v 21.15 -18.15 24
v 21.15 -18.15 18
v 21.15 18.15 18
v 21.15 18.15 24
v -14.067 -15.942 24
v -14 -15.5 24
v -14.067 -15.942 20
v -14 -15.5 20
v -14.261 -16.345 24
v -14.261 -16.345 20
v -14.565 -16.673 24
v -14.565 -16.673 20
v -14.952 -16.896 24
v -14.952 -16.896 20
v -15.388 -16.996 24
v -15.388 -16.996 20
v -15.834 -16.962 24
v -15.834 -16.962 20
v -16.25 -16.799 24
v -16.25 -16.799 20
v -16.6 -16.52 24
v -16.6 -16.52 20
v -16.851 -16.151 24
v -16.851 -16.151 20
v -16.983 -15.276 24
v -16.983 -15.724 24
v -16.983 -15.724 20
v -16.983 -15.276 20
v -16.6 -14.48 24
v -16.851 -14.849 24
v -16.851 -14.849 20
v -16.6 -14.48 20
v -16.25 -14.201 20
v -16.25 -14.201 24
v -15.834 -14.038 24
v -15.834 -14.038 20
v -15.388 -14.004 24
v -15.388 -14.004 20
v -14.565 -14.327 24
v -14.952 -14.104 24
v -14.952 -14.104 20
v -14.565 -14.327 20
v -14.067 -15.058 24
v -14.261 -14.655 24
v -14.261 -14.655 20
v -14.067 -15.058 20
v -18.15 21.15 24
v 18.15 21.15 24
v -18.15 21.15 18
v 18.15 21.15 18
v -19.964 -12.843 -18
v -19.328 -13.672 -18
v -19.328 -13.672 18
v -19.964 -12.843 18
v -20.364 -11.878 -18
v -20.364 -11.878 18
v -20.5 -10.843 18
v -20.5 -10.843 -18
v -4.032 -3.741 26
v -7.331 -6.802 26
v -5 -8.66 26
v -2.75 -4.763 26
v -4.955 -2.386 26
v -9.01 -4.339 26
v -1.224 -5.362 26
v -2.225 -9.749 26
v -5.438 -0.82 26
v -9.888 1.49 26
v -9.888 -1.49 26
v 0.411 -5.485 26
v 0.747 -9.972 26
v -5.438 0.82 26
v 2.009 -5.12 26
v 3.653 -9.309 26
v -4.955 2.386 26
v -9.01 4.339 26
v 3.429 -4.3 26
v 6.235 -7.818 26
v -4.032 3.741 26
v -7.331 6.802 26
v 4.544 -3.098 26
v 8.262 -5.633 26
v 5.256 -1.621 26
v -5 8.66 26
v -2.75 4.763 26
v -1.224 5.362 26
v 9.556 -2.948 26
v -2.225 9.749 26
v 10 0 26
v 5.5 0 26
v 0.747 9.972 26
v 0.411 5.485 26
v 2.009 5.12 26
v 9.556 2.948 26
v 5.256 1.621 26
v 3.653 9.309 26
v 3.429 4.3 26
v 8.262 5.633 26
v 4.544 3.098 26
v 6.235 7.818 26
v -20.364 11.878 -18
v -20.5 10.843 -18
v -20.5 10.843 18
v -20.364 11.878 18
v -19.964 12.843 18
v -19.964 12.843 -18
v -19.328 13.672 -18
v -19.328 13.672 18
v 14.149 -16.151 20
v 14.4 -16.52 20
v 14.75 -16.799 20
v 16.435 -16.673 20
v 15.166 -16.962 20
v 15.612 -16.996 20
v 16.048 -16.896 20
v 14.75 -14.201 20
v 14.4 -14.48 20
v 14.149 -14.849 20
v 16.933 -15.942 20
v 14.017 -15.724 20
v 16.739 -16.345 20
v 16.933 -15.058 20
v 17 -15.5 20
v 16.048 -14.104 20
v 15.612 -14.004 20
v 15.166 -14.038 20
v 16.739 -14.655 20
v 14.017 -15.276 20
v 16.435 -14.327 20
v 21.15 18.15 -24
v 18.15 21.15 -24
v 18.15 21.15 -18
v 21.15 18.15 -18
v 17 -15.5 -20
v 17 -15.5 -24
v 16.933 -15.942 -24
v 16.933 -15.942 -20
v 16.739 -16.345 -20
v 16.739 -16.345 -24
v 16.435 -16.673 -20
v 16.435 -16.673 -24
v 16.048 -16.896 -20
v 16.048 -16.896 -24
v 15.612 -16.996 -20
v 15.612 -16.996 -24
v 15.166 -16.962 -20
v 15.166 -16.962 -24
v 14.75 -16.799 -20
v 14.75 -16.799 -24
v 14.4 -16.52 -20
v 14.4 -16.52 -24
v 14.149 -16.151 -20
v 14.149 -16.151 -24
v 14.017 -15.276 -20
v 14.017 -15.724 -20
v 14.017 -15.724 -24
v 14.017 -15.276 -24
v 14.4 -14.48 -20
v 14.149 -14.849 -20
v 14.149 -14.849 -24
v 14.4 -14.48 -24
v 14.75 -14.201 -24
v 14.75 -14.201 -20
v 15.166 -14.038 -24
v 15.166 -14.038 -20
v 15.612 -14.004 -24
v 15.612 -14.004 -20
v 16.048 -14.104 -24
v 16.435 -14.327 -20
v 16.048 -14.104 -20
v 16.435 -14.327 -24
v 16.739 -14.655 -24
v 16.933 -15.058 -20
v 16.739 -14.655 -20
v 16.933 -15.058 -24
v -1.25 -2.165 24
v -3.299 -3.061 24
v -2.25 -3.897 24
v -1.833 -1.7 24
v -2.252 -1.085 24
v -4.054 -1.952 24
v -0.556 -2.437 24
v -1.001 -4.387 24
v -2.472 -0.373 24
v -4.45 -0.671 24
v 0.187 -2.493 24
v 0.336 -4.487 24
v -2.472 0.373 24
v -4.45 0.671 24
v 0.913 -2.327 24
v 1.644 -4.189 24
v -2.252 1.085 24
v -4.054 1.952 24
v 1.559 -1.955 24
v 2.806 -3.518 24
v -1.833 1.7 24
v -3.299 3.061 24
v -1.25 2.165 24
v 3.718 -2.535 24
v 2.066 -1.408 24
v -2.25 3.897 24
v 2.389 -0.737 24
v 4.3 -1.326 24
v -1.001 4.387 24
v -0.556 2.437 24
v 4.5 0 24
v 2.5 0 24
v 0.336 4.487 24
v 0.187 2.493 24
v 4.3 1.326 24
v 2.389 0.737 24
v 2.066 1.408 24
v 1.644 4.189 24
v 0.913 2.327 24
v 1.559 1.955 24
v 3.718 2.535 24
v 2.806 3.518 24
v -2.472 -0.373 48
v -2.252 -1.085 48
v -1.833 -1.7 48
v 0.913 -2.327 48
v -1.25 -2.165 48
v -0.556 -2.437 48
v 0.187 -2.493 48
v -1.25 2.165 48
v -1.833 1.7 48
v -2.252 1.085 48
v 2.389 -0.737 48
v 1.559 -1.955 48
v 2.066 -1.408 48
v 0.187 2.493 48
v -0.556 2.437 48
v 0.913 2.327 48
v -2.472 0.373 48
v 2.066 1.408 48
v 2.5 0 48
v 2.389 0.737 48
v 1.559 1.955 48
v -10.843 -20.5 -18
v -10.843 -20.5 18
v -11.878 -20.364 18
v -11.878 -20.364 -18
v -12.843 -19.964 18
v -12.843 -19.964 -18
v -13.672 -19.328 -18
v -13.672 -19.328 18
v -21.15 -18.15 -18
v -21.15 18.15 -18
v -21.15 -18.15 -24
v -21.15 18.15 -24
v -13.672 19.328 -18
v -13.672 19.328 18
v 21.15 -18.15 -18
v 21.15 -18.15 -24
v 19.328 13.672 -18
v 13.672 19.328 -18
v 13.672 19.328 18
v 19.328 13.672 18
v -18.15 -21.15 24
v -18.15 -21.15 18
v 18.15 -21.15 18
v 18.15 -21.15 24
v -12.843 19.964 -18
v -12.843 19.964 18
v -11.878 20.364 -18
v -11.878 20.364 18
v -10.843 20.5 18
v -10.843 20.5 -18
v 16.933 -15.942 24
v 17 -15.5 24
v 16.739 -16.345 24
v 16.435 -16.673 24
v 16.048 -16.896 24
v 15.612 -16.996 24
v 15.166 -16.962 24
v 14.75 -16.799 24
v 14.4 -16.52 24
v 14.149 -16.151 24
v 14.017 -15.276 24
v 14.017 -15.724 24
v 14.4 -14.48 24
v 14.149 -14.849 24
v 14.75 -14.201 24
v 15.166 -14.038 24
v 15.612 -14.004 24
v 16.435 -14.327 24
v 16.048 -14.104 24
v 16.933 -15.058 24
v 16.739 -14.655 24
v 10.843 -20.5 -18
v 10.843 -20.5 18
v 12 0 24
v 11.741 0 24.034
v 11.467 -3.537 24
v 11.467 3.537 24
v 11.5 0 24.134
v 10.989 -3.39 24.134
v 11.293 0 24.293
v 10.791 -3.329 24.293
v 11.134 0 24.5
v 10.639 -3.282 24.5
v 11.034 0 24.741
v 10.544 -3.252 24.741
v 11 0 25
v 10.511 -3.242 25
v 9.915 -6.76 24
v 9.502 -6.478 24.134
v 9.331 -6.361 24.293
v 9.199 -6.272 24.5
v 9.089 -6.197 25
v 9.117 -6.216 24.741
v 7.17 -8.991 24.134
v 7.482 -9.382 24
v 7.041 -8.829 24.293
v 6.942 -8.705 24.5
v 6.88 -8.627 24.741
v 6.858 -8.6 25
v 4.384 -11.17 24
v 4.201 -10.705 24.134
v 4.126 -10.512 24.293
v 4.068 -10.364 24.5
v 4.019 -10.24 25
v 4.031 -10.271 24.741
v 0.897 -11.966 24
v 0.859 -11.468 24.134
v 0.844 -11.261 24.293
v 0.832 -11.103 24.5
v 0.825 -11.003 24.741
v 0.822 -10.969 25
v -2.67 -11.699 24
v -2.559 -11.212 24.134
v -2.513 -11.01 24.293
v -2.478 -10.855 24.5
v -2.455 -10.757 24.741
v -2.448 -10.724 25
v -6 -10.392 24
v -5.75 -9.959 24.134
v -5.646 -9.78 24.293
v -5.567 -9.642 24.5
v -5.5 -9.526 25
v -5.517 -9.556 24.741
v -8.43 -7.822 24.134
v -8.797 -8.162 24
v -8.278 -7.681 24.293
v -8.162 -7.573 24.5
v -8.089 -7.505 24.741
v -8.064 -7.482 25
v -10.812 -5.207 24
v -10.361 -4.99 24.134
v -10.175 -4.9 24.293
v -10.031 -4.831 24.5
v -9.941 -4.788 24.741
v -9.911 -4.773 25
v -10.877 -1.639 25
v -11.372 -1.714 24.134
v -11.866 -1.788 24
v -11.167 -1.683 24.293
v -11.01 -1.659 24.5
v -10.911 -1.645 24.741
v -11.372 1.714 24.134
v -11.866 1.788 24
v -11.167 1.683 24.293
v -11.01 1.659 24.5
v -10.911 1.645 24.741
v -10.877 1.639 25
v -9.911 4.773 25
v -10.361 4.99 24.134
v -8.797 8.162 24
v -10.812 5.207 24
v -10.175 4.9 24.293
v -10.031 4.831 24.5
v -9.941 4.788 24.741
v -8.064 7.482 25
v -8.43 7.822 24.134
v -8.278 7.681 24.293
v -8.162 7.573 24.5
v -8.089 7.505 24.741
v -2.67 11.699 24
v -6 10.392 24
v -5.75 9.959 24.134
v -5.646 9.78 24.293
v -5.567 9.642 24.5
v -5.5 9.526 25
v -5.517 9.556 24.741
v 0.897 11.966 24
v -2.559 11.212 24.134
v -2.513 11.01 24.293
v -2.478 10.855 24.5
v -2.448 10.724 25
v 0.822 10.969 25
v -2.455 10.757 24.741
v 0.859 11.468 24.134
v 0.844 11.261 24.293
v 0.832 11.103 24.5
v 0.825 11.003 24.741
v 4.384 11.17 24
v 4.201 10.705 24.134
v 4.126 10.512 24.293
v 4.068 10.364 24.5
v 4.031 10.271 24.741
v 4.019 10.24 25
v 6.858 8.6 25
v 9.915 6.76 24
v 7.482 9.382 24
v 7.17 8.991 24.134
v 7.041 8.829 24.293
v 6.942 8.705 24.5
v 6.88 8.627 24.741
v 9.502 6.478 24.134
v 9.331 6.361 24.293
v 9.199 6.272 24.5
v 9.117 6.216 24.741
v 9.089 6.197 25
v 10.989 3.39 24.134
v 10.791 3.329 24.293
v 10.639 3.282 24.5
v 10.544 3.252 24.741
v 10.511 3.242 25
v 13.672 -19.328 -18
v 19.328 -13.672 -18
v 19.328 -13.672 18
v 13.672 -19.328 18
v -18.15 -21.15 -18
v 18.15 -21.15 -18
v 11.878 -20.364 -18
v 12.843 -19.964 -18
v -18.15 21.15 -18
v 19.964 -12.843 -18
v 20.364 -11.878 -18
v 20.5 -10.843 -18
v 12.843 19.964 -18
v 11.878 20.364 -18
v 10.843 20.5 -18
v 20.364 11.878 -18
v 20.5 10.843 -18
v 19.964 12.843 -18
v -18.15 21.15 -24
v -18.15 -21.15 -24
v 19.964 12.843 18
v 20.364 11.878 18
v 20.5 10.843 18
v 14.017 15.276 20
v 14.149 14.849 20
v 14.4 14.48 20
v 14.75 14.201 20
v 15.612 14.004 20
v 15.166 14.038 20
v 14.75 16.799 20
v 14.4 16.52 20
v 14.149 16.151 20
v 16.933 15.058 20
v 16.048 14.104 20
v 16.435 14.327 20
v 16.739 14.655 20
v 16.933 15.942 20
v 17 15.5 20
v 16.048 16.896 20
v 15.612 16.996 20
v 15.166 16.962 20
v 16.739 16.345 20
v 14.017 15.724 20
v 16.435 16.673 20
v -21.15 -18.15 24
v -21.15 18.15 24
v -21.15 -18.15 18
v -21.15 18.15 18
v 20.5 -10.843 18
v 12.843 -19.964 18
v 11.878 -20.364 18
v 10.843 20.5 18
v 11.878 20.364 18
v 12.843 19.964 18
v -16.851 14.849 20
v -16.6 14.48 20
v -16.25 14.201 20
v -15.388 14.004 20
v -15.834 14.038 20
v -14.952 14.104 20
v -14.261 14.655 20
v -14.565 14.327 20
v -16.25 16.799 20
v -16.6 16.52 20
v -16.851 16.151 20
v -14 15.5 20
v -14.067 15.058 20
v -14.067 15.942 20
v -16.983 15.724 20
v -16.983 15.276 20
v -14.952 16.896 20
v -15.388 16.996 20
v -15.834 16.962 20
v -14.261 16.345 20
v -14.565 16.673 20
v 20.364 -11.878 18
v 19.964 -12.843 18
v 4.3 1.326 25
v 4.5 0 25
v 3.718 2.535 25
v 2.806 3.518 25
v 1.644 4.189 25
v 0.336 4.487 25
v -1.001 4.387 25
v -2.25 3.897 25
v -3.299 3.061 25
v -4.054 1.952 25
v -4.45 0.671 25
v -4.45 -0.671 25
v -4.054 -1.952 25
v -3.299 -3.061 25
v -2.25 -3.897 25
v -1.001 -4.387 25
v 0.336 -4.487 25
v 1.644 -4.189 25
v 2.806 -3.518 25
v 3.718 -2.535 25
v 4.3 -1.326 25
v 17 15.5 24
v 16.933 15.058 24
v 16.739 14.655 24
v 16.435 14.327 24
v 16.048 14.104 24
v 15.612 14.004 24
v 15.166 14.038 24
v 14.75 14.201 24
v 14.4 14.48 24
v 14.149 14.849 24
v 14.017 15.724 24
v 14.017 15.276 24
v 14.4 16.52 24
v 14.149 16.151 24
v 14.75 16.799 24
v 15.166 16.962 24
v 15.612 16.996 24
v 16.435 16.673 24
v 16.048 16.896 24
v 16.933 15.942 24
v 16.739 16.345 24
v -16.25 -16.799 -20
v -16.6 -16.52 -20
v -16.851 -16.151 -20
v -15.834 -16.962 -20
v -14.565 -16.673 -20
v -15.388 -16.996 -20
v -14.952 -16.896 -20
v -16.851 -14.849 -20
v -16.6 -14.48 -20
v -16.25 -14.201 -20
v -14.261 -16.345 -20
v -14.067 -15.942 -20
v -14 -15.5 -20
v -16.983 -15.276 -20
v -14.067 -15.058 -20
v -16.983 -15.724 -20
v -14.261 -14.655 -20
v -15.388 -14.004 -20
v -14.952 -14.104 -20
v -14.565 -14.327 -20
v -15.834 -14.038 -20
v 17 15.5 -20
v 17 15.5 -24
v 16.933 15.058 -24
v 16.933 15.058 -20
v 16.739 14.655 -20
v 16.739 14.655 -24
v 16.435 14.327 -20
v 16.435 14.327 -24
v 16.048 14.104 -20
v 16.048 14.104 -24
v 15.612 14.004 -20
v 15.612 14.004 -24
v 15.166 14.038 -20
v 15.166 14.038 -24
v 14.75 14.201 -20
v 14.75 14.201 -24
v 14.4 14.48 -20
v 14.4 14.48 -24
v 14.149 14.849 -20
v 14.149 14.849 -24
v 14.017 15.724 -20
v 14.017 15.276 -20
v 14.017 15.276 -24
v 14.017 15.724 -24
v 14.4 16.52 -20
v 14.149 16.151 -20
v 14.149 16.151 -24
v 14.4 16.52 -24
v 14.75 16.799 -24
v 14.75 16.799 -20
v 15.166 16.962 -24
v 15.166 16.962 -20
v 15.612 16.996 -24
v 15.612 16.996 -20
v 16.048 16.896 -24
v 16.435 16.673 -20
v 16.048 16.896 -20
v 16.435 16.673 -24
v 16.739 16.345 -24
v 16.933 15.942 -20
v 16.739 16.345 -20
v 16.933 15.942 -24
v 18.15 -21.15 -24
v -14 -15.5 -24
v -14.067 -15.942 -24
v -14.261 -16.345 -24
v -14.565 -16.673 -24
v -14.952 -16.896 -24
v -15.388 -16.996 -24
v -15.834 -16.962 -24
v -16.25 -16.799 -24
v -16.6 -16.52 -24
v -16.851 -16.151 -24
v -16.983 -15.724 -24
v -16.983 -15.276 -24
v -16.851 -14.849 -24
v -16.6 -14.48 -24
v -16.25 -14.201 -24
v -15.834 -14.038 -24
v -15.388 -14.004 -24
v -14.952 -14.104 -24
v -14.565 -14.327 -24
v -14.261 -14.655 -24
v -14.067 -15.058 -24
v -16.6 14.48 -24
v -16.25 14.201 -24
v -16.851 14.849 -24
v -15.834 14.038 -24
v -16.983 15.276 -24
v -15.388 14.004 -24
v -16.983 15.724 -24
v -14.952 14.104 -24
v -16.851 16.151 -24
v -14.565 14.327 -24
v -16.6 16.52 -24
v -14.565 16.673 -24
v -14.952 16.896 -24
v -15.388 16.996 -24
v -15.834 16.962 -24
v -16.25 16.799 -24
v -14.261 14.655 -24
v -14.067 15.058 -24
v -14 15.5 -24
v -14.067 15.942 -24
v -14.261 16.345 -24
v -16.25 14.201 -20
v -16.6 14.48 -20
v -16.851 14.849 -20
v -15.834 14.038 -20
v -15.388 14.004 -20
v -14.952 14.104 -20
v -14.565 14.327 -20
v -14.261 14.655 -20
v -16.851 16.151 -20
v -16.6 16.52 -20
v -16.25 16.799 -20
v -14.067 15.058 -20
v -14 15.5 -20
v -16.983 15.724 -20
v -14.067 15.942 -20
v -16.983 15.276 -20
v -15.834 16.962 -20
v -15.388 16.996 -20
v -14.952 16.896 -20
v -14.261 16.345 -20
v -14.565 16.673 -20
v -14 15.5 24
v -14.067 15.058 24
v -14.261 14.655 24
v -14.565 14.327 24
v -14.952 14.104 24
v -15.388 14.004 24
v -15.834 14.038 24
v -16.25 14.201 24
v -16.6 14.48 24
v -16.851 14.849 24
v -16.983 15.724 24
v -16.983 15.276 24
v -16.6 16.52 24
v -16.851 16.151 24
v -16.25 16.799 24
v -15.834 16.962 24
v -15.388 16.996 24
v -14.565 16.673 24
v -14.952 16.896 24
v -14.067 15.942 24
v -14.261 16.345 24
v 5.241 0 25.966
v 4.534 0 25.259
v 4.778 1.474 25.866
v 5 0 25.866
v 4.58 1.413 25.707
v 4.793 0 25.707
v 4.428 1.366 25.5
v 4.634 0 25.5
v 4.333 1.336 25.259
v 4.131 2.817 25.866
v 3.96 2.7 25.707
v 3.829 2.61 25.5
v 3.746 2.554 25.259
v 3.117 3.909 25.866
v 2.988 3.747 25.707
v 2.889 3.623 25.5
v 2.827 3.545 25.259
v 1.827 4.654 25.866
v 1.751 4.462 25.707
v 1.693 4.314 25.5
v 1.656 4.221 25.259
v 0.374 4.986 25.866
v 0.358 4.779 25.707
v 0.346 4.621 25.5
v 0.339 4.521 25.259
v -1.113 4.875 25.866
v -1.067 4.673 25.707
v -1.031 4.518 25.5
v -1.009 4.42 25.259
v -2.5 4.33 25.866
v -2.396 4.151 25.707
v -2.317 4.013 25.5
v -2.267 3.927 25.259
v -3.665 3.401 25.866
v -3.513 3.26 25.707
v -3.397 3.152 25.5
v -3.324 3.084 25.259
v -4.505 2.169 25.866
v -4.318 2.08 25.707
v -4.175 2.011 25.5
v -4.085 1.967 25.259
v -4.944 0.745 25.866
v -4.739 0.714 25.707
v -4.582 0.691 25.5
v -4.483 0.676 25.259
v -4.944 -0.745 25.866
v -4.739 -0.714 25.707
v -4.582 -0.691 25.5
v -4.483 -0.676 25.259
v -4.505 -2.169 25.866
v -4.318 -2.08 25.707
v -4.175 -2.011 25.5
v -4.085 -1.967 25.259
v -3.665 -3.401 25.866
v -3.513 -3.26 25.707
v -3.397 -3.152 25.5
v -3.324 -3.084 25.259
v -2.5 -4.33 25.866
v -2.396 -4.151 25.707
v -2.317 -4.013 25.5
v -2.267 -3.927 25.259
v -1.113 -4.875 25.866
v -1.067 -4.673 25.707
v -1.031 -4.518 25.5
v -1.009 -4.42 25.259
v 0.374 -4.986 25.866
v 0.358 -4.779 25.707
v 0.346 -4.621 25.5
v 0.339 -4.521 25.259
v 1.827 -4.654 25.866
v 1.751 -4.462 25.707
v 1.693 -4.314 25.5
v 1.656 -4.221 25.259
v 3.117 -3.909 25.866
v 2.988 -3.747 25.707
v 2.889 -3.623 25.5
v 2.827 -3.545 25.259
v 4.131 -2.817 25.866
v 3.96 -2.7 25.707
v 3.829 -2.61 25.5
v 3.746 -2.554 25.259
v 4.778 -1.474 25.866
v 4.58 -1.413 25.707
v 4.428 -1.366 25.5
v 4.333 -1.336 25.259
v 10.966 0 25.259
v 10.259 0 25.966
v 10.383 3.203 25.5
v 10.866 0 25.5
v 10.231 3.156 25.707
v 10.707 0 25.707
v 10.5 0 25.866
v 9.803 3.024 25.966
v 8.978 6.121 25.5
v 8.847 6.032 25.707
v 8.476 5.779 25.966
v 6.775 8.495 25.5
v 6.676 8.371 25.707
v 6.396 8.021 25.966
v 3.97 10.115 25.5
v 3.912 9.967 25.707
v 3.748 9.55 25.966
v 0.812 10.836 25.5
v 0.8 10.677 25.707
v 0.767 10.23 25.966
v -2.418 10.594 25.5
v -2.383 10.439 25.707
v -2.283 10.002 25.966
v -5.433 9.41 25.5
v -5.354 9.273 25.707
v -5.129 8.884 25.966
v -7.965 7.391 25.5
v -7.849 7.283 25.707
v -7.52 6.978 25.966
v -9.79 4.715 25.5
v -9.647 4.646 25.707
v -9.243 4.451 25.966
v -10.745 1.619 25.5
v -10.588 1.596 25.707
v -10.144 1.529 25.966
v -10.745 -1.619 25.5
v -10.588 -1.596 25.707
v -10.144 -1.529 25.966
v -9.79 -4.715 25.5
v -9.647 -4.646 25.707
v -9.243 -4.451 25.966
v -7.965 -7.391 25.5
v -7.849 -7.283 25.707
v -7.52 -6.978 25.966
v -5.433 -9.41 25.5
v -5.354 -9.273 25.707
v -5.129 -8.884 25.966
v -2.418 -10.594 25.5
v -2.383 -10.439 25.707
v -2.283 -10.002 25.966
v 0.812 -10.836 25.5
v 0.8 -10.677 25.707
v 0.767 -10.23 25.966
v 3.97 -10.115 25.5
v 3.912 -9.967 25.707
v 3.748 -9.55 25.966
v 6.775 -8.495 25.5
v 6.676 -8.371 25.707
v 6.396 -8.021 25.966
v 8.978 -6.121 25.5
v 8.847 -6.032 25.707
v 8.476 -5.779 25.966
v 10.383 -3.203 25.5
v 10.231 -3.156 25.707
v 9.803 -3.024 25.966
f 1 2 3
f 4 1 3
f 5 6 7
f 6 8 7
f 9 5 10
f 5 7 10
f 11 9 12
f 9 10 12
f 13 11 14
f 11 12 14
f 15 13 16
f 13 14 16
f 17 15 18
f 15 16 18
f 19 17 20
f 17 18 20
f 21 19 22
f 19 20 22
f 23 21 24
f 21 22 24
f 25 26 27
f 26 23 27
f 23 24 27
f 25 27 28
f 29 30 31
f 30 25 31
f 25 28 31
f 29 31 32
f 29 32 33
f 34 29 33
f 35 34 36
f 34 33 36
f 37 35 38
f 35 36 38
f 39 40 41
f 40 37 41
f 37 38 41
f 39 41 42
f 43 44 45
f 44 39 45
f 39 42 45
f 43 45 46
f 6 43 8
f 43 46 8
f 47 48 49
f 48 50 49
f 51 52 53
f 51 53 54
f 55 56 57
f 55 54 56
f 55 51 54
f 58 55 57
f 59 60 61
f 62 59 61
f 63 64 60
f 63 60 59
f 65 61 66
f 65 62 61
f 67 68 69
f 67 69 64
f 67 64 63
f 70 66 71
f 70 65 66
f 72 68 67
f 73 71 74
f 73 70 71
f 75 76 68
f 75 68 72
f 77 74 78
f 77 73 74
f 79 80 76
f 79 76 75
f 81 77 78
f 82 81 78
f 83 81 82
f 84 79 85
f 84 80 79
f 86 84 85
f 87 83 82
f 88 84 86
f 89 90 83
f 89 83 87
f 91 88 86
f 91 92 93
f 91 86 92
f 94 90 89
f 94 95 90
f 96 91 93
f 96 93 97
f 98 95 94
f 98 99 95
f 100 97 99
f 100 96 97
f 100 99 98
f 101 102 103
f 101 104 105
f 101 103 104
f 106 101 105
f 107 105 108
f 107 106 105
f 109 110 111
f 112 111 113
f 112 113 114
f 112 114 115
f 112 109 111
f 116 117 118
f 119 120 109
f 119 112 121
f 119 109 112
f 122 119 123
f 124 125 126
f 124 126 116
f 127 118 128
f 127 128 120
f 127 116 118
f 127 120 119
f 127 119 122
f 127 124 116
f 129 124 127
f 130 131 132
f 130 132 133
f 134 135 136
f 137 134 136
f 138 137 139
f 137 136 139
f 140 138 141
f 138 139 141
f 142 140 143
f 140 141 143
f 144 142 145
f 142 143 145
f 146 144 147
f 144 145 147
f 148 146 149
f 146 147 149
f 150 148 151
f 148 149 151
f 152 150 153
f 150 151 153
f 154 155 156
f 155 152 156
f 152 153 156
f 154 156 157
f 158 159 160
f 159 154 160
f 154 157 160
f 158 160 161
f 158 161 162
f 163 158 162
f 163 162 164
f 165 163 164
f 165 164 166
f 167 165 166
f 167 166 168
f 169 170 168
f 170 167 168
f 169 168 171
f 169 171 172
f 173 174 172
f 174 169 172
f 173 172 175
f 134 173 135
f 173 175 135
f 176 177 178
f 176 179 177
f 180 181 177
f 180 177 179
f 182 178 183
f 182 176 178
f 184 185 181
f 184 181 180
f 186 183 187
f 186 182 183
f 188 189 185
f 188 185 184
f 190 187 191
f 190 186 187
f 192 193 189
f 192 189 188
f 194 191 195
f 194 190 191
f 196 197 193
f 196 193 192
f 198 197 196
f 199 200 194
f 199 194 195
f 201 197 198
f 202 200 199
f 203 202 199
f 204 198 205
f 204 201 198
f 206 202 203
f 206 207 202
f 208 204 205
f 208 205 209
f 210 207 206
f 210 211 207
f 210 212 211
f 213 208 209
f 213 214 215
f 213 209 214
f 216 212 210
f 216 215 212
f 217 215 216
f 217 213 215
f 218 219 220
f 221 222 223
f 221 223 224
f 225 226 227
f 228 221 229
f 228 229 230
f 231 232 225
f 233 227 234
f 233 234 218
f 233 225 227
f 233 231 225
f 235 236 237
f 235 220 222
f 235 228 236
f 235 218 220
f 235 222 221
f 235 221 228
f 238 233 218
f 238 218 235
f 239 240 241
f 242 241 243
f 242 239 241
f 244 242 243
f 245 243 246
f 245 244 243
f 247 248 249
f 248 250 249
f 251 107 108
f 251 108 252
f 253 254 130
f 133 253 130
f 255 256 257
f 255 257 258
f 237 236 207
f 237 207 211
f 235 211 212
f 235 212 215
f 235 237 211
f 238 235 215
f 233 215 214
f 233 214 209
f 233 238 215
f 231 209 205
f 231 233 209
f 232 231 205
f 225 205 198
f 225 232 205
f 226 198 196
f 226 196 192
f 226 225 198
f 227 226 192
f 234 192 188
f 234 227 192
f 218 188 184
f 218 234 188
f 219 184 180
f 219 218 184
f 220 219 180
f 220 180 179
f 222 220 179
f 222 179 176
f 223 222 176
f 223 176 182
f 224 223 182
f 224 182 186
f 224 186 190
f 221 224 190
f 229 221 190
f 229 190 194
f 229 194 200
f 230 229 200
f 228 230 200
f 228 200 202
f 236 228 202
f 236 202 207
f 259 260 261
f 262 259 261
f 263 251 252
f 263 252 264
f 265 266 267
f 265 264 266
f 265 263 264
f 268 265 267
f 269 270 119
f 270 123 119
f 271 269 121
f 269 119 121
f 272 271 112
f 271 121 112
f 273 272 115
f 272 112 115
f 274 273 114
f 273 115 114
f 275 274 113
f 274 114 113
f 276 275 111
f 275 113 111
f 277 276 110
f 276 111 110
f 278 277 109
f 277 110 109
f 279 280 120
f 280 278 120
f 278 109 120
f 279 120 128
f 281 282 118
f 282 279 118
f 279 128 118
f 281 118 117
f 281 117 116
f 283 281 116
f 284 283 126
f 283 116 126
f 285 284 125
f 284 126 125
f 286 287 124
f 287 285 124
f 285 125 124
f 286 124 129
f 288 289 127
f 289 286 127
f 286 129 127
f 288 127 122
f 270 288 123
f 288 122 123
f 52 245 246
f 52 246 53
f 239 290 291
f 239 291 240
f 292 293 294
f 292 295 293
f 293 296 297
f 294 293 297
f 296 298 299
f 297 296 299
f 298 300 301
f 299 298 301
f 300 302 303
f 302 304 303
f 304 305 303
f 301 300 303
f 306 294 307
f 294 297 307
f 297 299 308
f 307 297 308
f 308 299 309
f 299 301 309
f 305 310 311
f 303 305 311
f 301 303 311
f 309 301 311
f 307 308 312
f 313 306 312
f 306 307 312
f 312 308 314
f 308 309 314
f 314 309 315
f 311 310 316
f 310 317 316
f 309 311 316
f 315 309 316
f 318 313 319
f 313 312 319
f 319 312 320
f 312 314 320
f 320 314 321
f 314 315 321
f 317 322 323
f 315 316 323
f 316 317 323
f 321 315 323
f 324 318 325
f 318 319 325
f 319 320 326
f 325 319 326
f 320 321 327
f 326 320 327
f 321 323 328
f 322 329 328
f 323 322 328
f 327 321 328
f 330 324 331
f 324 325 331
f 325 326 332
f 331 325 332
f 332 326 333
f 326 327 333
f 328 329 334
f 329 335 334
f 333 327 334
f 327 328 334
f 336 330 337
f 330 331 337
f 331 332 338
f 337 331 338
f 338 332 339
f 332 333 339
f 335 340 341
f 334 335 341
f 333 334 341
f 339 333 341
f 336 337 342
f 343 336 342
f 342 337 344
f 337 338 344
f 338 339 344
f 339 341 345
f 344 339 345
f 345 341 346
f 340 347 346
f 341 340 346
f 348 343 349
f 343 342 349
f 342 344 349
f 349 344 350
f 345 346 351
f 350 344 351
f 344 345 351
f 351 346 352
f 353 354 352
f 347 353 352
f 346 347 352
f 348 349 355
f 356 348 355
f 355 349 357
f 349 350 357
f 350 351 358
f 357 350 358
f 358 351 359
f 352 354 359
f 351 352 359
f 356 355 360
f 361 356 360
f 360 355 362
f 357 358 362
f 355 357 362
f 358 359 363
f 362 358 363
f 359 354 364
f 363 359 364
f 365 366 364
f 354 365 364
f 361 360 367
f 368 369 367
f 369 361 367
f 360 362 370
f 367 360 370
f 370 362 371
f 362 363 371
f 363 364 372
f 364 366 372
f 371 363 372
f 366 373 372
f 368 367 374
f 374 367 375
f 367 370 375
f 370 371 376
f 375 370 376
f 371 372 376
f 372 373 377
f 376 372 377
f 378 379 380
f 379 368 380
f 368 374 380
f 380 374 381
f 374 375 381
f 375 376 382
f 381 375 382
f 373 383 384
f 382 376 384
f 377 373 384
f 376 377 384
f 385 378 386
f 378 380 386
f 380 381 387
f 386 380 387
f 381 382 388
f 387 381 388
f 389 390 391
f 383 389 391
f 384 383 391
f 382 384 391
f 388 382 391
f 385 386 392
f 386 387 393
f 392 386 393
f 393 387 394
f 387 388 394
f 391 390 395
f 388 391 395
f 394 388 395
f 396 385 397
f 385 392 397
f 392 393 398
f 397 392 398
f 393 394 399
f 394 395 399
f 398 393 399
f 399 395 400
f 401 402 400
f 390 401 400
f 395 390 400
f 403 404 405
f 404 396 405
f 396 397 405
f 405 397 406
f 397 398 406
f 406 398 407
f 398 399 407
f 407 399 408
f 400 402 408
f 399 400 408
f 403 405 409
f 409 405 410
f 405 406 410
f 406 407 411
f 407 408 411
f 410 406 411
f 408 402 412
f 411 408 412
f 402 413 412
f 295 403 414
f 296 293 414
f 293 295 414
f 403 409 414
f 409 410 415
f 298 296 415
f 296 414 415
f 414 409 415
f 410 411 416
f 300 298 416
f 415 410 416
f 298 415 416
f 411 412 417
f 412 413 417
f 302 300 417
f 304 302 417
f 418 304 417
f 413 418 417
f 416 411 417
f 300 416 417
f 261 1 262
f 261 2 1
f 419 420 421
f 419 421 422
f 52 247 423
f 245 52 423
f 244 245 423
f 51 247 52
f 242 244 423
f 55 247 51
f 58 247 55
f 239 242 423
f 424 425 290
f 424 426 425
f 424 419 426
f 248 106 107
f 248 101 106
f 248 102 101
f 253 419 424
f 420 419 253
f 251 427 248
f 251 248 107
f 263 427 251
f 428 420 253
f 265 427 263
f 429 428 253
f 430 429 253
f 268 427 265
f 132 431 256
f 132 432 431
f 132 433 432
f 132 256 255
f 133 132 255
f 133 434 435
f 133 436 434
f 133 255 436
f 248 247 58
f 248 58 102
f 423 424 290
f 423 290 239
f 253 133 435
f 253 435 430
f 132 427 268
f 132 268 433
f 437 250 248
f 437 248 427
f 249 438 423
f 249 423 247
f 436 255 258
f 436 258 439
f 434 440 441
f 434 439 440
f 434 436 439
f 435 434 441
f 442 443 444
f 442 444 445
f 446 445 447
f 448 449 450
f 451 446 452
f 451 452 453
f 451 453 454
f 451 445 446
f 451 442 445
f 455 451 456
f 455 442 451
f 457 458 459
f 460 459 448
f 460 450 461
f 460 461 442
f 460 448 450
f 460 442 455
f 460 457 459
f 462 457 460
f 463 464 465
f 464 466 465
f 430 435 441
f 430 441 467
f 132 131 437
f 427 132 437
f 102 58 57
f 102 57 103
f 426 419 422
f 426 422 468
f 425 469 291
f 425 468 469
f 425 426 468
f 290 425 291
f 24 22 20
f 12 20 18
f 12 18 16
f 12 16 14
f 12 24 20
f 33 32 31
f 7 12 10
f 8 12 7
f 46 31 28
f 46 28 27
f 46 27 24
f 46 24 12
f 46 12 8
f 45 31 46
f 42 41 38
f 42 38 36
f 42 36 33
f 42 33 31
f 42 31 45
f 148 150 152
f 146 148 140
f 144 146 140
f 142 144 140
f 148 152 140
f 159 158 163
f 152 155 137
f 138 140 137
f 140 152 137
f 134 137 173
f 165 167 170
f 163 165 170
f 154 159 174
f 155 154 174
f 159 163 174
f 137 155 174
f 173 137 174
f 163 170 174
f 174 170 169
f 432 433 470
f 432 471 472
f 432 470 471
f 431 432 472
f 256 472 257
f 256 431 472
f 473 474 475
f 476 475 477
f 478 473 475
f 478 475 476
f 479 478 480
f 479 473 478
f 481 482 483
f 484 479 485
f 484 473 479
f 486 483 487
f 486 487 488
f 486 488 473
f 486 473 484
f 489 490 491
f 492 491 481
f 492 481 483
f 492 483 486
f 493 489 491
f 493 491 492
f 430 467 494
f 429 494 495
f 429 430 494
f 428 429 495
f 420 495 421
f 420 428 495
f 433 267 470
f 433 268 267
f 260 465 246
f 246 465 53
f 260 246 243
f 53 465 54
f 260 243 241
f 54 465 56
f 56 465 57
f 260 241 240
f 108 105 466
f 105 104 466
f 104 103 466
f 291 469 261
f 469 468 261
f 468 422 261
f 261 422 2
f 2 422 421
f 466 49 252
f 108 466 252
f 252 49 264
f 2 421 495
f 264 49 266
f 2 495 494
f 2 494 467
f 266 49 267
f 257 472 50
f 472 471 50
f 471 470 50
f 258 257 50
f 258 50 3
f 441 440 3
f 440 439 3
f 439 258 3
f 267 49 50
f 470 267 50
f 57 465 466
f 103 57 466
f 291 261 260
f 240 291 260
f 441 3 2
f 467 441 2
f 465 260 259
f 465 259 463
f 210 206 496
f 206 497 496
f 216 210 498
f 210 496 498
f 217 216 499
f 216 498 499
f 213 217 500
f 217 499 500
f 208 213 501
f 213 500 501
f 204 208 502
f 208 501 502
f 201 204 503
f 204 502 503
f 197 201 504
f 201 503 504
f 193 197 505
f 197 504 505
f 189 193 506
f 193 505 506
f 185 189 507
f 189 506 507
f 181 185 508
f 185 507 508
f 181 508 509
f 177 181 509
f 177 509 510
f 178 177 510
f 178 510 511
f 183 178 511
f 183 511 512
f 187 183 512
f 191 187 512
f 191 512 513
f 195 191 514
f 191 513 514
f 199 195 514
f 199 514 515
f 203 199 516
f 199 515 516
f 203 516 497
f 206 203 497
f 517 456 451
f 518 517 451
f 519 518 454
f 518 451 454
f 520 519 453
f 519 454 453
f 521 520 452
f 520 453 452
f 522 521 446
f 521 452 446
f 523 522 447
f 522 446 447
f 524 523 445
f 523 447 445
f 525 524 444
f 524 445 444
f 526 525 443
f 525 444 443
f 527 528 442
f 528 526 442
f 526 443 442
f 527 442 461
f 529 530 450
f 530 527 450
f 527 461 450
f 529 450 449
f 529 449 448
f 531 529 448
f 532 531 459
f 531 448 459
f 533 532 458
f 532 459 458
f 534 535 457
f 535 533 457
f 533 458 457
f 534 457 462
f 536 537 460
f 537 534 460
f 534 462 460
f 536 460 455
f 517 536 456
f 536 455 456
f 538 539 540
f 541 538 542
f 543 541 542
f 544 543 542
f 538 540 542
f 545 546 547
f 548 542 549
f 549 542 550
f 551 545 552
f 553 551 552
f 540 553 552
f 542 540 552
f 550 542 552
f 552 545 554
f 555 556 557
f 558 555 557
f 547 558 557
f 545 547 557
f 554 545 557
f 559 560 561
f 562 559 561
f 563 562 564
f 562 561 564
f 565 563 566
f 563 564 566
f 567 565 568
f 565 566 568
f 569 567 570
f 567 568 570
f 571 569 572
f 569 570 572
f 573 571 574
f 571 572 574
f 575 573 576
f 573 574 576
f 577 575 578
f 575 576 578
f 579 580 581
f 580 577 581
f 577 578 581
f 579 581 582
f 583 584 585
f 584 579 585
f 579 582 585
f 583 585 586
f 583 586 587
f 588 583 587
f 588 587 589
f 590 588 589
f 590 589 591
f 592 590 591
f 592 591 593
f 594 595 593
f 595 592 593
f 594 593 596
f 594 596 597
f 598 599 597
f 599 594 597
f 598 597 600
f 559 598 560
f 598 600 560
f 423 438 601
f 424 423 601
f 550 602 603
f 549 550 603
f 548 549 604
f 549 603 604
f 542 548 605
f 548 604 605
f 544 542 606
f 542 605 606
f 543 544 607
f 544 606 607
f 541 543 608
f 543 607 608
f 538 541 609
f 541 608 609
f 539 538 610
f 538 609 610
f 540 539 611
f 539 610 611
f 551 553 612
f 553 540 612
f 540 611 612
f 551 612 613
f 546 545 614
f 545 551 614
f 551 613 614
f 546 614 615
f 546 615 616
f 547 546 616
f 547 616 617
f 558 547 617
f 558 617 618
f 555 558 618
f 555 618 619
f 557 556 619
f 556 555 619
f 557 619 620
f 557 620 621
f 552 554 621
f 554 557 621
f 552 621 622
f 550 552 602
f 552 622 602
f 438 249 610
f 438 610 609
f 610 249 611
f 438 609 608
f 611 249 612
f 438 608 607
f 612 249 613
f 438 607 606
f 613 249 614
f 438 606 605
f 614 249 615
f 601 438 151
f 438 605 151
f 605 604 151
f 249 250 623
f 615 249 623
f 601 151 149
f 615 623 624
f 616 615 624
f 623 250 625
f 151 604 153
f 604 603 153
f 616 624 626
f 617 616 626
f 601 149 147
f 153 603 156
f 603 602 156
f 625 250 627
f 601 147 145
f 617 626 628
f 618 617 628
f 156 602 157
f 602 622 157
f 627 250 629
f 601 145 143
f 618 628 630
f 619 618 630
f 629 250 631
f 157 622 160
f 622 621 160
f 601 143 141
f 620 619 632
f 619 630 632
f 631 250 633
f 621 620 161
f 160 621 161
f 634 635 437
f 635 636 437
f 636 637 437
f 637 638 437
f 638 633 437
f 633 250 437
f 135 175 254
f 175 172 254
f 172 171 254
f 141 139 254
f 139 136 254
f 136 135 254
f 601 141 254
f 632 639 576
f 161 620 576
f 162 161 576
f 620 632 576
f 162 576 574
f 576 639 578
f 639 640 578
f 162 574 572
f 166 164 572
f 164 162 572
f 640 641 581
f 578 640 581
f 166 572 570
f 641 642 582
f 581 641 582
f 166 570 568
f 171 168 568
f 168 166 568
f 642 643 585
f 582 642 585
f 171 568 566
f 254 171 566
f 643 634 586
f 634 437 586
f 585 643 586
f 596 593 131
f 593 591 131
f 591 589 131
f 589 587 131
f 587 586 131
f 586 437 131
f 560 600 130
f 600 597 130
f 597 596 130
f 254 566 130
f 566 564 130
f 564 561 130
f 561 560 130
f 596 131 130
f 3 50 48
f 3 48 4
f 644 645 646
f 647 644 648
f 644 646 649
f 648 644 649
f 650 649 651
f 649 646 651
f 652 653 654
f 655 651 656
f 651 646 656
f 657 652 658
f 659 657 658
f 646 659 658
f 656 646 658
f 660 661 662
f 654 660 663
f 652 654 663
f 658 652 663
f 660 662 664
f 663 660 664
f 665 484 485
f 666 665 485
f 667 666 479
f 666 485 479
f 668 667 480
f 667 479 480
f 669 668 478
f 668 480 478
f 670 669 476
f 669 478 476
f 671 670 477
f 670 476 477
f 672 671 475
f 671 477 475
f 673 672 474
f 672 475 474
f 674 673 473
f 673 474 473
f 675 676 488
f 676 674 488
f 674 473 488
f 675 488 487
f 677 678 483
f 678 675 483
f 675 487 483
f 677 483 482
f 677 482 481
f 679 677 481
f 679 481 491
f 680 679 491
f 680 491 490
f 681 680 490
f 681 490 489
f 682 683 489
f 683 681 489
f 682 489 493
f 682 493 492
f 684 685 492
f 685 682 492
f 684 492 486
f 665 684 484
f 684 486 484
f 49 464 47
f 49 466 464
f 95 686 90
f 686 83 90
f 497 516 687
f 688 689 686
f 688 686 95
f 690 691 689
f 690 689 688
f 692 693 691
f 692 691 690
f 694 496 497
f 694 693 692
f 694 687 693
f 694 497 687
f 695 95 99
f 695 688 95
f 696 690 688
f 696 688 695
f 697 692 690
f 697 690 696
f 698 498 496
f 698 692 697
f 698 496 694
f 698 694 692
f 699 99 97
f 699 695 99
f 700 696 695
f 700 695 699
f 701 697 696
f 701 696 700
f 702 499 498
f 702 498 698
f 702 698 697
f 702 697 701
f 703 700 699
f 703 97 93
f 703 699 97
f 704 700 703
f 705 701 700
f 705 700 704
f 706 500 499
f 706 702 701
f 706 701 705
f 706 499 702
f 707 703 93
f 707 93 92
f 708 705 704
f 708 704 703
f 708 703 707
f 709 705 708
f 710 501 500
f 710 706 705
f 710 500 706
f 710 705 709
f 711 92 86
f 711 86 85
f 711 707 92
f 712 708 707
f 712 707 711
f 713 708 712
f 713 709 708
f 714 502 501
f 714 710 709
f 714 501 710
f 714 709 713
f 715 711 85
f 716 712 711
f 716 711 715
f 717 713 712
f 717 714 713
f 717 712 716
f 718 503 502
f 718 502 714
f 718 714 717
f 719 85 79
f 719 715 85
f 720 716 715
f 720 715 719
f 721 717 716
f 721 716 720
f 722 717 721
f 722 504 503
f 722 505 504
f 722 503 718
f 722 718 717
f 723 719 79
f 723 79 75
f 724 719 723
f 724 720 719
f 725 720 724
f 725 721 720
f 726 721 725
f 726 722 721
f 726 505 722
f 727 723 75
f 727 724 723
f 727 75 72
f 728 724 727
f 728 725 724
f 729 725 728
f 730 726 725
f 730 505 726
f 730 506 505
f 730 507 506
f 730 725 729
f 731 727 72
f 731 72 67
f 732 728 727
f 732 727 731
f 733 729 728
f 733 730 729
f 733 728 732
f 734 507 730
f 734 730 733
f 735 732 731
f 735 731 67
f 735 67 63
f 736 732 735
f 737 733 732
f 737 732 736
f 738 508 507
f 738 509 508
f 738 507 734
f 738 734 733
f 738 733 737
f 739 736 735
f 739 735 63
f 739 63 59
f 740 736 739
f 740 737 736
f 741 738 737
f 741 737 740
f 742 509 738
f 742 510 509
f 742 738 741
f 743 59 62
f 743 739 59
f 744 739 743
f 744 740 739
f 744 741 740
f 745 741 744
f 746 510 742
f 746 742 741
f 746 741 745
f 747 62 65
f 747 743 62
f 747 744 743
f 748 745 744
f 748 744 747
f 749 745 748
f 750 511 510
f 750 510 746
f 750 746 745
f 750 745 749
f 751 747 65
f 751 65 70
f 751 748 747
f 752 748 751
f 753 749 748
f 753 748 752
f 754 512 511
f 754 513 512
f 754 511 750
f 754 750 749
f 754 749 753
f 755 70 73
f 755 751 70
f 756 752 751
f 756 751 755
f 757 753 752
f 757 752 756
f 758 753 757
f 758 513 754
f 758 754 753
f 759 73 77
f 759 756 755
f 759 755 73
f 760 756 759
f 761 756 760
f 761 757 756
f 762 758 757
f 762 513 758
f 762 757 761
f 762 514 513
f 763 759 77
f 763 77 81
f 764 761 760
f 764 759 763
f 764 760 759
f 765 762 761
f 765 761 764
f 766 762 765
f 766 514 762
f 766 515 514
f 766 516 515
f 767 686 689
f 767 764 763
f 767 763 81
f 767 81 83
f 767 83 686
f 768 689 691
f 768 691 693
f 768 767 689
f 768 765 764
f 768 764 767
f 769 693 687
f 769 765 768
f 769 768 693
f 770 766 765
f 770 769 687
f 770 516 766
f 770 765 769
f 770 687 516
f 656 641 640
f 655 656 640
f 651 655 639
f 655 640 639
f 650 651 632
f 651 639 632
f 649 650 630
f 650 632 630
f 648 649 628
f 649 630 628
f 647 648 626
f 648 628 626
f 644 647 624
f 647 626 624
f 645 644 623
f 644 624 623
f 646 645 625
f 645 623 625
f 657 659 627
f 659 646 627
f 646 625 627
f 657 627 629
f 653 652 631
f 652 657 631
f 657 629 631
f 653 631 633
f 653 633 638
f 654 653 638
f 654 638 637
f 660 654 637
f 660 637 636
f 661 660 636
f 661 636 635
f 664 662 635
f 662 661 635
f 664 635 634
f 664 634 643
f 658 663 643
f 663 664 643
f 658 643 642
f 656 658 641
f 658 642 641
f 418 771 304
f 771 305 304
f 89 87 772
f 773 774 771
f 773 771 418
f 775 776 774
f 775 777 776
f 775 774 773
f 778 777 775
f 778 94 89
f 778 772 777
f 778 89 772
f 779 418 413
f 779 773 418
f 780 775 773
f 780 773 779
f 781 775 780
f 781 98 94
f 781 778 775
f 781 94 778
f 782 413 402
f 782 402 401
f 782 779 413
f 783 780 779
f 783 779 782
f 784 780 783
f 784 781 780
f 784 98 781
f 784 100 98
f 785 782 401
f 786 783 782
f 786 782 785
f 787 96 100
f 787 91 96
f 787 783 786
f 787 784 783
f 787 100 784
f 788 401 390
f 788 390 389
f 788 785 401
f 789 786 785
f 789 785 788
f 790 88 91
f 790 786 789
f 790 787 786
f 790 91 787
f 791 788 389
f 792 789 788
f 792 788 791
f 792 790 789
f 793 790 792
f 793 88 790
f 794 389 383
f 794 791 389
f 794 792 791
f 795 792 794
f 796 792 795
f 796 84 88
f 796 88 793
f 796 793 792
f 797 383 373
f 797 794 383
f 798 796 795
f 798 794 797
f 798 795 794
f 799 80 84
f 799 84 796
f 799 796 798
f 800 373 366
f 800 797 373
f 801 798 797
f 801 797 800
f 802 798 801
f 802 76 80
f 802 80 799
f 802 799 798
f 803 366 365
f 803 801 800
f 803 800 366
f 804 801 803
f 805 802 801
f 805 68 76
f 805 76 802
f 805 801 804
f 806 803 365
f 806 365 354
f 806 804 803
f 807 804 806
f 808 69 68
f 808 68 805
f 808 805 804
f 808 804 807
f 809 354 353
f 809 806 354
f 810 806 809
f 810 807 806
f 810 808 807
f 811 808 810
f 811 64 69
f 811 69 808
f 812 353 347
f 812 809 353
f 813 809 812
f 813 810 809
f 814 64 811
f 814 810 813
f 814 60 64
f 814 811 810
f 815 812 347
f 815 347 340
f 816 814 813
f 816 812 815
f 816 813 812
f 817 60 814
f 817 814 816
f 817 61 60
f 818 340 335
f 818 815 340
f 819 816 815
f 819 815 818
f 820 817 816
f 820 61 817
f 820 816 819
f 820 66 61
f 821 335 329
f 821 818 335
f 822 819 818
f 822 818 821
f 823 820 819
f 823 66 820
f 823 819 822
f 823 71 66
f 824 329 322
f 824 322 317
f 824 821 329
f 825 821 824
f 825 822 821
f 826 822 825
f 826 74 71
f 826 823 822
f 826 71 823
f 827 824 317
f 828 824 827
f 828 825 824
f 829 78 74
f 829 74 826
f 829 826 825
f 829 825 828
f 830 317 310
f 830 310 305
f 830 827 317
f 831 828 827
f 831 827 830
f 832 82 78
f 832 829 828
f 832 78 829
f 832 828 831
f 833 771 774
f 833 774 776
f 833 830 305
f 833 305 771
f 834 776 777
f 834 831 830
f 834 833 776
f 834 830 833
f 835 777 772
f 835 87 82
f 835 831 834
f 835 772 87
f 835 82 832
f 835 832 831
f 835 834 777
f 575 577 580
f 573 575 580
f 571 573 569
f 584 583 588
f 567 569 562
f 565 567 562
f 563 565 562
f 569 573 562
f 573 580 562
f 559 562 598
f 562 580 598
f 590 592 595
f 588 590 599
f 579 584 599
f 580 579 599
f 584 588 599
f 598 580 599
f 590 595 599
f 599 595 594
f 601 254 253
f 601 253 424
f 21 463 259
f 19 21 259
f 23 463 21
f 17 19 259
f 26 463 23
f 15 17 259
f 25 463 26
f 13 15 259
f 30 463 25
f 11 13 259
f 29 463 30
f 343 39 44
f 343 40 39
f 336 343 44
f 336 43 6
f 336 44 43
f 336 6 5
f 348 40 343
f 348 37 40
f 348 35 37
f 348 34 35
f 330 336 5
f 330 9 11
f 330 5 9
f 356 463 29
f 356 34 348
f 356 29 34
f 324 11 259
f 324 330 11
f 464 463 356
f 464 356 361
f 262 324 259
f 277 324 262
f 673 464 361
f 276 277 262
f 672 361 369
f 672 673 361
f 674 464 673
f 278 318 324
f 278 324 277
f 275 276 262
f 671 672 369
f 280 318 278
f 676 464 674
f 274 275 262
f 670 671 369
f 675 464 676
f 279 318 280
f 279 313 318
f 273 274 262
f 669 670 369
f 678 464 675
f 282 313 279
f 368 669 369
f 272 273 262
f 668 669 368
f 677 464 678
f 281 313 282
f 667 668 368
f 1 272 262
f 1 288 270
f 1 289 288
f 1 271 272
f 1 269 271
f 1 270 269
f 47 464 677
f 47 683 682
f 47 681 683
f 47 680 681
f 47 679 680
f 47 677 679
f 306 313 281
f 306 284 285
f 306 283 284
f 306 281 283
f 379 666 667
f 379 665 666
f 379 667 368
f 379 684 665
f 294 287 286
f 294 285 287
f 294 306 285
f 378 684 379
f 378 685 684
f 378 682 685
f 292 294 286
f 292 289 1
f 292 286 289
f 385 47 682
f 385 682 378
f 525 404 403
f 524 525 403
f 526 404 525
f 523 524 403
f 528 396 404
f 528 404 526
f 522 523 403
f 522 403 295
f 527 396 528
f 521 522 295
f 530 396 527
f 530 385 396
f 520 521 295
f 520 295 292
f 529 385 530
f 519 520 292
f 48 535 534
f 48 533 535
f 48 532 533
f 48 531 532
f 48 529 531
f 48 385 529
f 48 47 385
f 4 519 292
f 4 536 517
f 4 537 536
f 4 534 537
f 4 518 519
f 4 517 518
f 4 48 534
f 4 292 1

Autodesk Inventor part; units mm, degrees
ref_plane "YZ Plane" through (0, 0, 0) normal (1, 0, 0) x (0, 1, 0)
ref_plane "XZ Plane" through (0, 0, 0) normal (0, 1, 0) x (-1, 0, 0)
ref_plane "XY Plane" through (0, 0, 0) normal (0, 0, 1) x (1, 0, 0)
sketch "Sketch1" plane through (0, 0, 0) normal (0, 0, 1) x (1, 0, 0)
  line L0 (-18.15, -21.15) -> (18.15, -21.15)
  line L1 (21.15, -18.15) -> (21.15, 18.15)
  line L2 (18.15, 21.15) -> (-18.15, 21.15)
  line L3 (-21.15, 18.15) -> (-21.15, -18.15)
  line L4 (-21.15, -21.15) -> (21.15, 21.15) construction
  line L5 (21.15, -21.15) -> (-21.15, 21.15) construction
  line L6 (-21.15, 18.15) -> (-18.15, 21.15)
  line L7 (18.15, 21.15) -> (21.15, 18.15)
  line L8 (21.15, -18.15) -> (18.15, -21.15)
  line L9 (-18.15, -21.15) -> (-21.15, -18.15)
  line L10 (-15.5, -15.5) -> (15.5, -15.5) construction
  line L11 (15.5, -15.5) -> (15.5, 15.5) construction
  line L12 (15.5, 15.5) -> (-15.5, 15.5) construction
  line L13 (-15.5, 15.5) -> (-15.5, -15.5) construction
  line L14 (-15.5, -15.5) -> (15.5, 15.5) construction
  line L15 (15.5, -15.5) -> (-15.5, 15.5) construction
  circle A0 centre (-15.5, 15.5) radius 1.5
  circle A1 centre (15.5, 15.5) radius 1.5
  circle A2 centre (15.5, -15.5) radius 1.5
  circle A3 centre (-15.5, -15.5) radius 1.5
  point P0 (0, 0)
  dimension "d0" = 42.3
  dimension "d1" = 42.3
  dimension "d2" = 3
  dimension "d3" = 3
  dimension "d4" = 3
  dimension "d5" = 3
  dimension "d6" = 3
  dimension "d7" = 3
  dimension "d8" = 3
  dimension "d9" = 3
  dimension "d10" = 31
  dimension "d11" = 31
  dimension "d12" = 3
  dimension "d13" = 3
  dimension "d14" = 3
  dimension "d15" = 3
extrude "Extrusion1" add sketch "Sketch1" along normal mid plane 48
sketch "Sketch2" plane through (0, 0, 0) normal (0, 0, 1) x (1, 0, 0)
  circle A0 centre (-15.5, 15.5) radius 1.5 projected
  circle A1 centre (15.5, 15.5) radius 1.5 projected
  circle A2 centre (15.5, -15.5) radius 1.5 projected
  circle A3 centre (-15.5, -15.5) radius 1.5 projected
  point P0 (0, 0)
extrude "Extrusion2" add sketch "Sketch2" along normal mid plane 40
sketch "Sketch3" plane through (0, 0, 0) normal (0, 0, 1) x (1, 0, 0)
  line L0 (10.8431, -20.5) -> (-10.8431, -20.5)
  line L1 (-20.5, -10.8431) -> (-20.5, 10.8431)
  line L2 (-10.8431, 20.5) -> (10.8431, 20.5)
  line L3 (20.5, 10.8431) -> (20.5, -10.8431)
  line L4 (20.5, -20.5) -> (-20.5, 20.5) construction
  line L5 (-20.5, -20.5) -> (20.5, 20.5) construction
  line L6 (-19.3284, 13.6716) -> (-13.6716, 19.3284)
  line L7 (13.6716, 19.3284) -> (19.3284, 13.6716)
  line L8 (19.3284, -13.6716) -> (13.6716, -19.3284)
  line L9 (-13.6716, -19.3284) -> (-19.3284, -13.6716)
  arc A0 (-10.8431, 20.5) -> (-13.6716, 19.3284) centre (-10.8431, 16.5) ccw
  arc A1 (-19.3284, 13.6716) -> (-20.5, 10.8431) centre (-16.5, 10.8431) ccw
  arc A2 (13.6716, 19.3284) -> (10.8431, 20.5) centre (10.8431, 16.5) ccw
  arc A3 (20.5, 10.8431) -> (19.3284, 13.6716) centre (16.5, 10.8431) ccw
  arc A4 (19.3284, -13.6716) -> (20.5, -10.8431) centre (16.5, -10.8431) ccw
  arc A5 (10.8431, -20.5) -> (13.6716, -19.3284) centre (10.8431, -16.5) ccw
  arc A6 (-13.6716, -19.3284) -> (-10.8431, -20.5) centre (-10.8431, -16.5) ccw
  arc A7 (-20.5, -10.8431) -> (-19.3284, -13.6716) centre (-16.5, -10.8431) ccw
  line L10 (-21.15, 18.15) -> (-18.15, 21.15) projected
  line L11 (-18.15, 21.15) -> (18.15, 21.15) projected
  line L12 (18.15, 21.15) -> (21.15, 18.15) projected
  line L13 (21.15, 18.15) -> (21.15, -18.15) projected
  line L14 (21.15, -18.15) -> (18.15, -21.15) projected
  line L15 (18.15, -21.15) -> (-18.15, -21.15) projected
  line L16 (-18.15, -21.15) -> (-21.15, -18.15) projected
  line L17 (-21.15, -18.15) -> (-21.15, 18.15) projected
  circle A8 centre (-15.5, 15.5) radius 1.5 projected
  circle A9 centre (15.5, 15.5) radius 1.5 projected
  circle A10 centre (15.5, -15.5) radius 1.5 projected
  circle A11 centre (-15.5, -15.5) radius 1.5 projected
  point P0 (0, 0)
  point P1 (-20.5, 12.5)
  point P2 (-12.5, 20.5)
  point P3 (12.5, 20.5)
  point P4 (20.5, 12.5)
  point P5 (20.5, -12.5)
  point P6 (12.5, -20.5)
  point P7 (-12.5, -20.5)
  point P8 (-20.5, -12.5)
  point P9 (-11.3431, -21.15)
  point P10 (-21.15, -11.4931)
  point P11 (11.3431, -21.15)
  point P12 (21.15, -11.4931)
  point P13 (21.15, 11.4931)
  point P14 (11.3431, 21.15)
  point P15 (-11.3431, 21.15)
  point P16 (-21.15, 11.4931)
  dimension "d20" = 41
  dimension "d21" = 41
  dimension "d22" = 8
  dimension "d23" = 8
  dimension "d24" = 8
  dimension "d25" = 8
  dimension "d26" = 8
  dimension "d27" = 8
  dimension "d28" = 8
  dimension "d29" = 8
  dimension "d30" = 4
extrude "Extrusion3" cut sketch "Sketch3" along normal mid plane 36 contours L8 A10 | A11 L9 | L7 A9 | A8 L6 | L10 L11 L12 L13 L14 L15 L16 L17 picked at (16.5579, -16.478) picked at (-16.478, -16.5579) picked at (16.5579, 16.478) picked at (-16.5579, 16.478)
sketch "Sketch4" plane through (0, 0, 24) normal (0, 0, 1) x (1, 0, 0)
  circle A0 centre (0, 0) radius 11
  dimension "d33" = 22
extrude "Extrusion4" add sketch "Sketch4" along normal blind 2
sketch "Sketch5" plane through (0, 0, 26) normal (0, 0, 1) x (1, 0, 0)
  circle A0 centre (0, 0) radius 2.5
  dimension "d36" = 5
extrude "Extrusion5" add sketch "Sketch5" along normal blind 22
sketch "Sketch6" plane through (0, 0, 26) normal (0, 0, 1) x (1, 0, 0)
  circle A0 centre (0, 0) radius 2.5 projected
  circle A1 centre (0, 0) radius 4.5
  dimension "d39" = 2
extrude "Extrusion6" cut sketch "Sketch6" against normal blind 2
fillet "Fillet1" radius 1 3 edges at (-11, 0, 24) (-4.5, 0, 26) (-11, 0, 26)
equation "\"d3\" = d2"
equation "\"d4\" = d2"
equation "\"d5\" = d4"
equation "\"d6\" = d2"
equation "\"d7\" = d6"
equation "\"d8\" = d2"
equation "\"d9\" = d8"
equation "\"d23\" = d22"
equation "\"d24\" = d22"
equation "\"d25\" = d24"
equation "\"d26\" = d22"
equation "\"d27\" = d26"
equation "\"d28\" = d22"
equation "\"d29\" = d28"
properties part number "3217_Stepper Motor_V1" material "Stainless Steel, Brushed"
